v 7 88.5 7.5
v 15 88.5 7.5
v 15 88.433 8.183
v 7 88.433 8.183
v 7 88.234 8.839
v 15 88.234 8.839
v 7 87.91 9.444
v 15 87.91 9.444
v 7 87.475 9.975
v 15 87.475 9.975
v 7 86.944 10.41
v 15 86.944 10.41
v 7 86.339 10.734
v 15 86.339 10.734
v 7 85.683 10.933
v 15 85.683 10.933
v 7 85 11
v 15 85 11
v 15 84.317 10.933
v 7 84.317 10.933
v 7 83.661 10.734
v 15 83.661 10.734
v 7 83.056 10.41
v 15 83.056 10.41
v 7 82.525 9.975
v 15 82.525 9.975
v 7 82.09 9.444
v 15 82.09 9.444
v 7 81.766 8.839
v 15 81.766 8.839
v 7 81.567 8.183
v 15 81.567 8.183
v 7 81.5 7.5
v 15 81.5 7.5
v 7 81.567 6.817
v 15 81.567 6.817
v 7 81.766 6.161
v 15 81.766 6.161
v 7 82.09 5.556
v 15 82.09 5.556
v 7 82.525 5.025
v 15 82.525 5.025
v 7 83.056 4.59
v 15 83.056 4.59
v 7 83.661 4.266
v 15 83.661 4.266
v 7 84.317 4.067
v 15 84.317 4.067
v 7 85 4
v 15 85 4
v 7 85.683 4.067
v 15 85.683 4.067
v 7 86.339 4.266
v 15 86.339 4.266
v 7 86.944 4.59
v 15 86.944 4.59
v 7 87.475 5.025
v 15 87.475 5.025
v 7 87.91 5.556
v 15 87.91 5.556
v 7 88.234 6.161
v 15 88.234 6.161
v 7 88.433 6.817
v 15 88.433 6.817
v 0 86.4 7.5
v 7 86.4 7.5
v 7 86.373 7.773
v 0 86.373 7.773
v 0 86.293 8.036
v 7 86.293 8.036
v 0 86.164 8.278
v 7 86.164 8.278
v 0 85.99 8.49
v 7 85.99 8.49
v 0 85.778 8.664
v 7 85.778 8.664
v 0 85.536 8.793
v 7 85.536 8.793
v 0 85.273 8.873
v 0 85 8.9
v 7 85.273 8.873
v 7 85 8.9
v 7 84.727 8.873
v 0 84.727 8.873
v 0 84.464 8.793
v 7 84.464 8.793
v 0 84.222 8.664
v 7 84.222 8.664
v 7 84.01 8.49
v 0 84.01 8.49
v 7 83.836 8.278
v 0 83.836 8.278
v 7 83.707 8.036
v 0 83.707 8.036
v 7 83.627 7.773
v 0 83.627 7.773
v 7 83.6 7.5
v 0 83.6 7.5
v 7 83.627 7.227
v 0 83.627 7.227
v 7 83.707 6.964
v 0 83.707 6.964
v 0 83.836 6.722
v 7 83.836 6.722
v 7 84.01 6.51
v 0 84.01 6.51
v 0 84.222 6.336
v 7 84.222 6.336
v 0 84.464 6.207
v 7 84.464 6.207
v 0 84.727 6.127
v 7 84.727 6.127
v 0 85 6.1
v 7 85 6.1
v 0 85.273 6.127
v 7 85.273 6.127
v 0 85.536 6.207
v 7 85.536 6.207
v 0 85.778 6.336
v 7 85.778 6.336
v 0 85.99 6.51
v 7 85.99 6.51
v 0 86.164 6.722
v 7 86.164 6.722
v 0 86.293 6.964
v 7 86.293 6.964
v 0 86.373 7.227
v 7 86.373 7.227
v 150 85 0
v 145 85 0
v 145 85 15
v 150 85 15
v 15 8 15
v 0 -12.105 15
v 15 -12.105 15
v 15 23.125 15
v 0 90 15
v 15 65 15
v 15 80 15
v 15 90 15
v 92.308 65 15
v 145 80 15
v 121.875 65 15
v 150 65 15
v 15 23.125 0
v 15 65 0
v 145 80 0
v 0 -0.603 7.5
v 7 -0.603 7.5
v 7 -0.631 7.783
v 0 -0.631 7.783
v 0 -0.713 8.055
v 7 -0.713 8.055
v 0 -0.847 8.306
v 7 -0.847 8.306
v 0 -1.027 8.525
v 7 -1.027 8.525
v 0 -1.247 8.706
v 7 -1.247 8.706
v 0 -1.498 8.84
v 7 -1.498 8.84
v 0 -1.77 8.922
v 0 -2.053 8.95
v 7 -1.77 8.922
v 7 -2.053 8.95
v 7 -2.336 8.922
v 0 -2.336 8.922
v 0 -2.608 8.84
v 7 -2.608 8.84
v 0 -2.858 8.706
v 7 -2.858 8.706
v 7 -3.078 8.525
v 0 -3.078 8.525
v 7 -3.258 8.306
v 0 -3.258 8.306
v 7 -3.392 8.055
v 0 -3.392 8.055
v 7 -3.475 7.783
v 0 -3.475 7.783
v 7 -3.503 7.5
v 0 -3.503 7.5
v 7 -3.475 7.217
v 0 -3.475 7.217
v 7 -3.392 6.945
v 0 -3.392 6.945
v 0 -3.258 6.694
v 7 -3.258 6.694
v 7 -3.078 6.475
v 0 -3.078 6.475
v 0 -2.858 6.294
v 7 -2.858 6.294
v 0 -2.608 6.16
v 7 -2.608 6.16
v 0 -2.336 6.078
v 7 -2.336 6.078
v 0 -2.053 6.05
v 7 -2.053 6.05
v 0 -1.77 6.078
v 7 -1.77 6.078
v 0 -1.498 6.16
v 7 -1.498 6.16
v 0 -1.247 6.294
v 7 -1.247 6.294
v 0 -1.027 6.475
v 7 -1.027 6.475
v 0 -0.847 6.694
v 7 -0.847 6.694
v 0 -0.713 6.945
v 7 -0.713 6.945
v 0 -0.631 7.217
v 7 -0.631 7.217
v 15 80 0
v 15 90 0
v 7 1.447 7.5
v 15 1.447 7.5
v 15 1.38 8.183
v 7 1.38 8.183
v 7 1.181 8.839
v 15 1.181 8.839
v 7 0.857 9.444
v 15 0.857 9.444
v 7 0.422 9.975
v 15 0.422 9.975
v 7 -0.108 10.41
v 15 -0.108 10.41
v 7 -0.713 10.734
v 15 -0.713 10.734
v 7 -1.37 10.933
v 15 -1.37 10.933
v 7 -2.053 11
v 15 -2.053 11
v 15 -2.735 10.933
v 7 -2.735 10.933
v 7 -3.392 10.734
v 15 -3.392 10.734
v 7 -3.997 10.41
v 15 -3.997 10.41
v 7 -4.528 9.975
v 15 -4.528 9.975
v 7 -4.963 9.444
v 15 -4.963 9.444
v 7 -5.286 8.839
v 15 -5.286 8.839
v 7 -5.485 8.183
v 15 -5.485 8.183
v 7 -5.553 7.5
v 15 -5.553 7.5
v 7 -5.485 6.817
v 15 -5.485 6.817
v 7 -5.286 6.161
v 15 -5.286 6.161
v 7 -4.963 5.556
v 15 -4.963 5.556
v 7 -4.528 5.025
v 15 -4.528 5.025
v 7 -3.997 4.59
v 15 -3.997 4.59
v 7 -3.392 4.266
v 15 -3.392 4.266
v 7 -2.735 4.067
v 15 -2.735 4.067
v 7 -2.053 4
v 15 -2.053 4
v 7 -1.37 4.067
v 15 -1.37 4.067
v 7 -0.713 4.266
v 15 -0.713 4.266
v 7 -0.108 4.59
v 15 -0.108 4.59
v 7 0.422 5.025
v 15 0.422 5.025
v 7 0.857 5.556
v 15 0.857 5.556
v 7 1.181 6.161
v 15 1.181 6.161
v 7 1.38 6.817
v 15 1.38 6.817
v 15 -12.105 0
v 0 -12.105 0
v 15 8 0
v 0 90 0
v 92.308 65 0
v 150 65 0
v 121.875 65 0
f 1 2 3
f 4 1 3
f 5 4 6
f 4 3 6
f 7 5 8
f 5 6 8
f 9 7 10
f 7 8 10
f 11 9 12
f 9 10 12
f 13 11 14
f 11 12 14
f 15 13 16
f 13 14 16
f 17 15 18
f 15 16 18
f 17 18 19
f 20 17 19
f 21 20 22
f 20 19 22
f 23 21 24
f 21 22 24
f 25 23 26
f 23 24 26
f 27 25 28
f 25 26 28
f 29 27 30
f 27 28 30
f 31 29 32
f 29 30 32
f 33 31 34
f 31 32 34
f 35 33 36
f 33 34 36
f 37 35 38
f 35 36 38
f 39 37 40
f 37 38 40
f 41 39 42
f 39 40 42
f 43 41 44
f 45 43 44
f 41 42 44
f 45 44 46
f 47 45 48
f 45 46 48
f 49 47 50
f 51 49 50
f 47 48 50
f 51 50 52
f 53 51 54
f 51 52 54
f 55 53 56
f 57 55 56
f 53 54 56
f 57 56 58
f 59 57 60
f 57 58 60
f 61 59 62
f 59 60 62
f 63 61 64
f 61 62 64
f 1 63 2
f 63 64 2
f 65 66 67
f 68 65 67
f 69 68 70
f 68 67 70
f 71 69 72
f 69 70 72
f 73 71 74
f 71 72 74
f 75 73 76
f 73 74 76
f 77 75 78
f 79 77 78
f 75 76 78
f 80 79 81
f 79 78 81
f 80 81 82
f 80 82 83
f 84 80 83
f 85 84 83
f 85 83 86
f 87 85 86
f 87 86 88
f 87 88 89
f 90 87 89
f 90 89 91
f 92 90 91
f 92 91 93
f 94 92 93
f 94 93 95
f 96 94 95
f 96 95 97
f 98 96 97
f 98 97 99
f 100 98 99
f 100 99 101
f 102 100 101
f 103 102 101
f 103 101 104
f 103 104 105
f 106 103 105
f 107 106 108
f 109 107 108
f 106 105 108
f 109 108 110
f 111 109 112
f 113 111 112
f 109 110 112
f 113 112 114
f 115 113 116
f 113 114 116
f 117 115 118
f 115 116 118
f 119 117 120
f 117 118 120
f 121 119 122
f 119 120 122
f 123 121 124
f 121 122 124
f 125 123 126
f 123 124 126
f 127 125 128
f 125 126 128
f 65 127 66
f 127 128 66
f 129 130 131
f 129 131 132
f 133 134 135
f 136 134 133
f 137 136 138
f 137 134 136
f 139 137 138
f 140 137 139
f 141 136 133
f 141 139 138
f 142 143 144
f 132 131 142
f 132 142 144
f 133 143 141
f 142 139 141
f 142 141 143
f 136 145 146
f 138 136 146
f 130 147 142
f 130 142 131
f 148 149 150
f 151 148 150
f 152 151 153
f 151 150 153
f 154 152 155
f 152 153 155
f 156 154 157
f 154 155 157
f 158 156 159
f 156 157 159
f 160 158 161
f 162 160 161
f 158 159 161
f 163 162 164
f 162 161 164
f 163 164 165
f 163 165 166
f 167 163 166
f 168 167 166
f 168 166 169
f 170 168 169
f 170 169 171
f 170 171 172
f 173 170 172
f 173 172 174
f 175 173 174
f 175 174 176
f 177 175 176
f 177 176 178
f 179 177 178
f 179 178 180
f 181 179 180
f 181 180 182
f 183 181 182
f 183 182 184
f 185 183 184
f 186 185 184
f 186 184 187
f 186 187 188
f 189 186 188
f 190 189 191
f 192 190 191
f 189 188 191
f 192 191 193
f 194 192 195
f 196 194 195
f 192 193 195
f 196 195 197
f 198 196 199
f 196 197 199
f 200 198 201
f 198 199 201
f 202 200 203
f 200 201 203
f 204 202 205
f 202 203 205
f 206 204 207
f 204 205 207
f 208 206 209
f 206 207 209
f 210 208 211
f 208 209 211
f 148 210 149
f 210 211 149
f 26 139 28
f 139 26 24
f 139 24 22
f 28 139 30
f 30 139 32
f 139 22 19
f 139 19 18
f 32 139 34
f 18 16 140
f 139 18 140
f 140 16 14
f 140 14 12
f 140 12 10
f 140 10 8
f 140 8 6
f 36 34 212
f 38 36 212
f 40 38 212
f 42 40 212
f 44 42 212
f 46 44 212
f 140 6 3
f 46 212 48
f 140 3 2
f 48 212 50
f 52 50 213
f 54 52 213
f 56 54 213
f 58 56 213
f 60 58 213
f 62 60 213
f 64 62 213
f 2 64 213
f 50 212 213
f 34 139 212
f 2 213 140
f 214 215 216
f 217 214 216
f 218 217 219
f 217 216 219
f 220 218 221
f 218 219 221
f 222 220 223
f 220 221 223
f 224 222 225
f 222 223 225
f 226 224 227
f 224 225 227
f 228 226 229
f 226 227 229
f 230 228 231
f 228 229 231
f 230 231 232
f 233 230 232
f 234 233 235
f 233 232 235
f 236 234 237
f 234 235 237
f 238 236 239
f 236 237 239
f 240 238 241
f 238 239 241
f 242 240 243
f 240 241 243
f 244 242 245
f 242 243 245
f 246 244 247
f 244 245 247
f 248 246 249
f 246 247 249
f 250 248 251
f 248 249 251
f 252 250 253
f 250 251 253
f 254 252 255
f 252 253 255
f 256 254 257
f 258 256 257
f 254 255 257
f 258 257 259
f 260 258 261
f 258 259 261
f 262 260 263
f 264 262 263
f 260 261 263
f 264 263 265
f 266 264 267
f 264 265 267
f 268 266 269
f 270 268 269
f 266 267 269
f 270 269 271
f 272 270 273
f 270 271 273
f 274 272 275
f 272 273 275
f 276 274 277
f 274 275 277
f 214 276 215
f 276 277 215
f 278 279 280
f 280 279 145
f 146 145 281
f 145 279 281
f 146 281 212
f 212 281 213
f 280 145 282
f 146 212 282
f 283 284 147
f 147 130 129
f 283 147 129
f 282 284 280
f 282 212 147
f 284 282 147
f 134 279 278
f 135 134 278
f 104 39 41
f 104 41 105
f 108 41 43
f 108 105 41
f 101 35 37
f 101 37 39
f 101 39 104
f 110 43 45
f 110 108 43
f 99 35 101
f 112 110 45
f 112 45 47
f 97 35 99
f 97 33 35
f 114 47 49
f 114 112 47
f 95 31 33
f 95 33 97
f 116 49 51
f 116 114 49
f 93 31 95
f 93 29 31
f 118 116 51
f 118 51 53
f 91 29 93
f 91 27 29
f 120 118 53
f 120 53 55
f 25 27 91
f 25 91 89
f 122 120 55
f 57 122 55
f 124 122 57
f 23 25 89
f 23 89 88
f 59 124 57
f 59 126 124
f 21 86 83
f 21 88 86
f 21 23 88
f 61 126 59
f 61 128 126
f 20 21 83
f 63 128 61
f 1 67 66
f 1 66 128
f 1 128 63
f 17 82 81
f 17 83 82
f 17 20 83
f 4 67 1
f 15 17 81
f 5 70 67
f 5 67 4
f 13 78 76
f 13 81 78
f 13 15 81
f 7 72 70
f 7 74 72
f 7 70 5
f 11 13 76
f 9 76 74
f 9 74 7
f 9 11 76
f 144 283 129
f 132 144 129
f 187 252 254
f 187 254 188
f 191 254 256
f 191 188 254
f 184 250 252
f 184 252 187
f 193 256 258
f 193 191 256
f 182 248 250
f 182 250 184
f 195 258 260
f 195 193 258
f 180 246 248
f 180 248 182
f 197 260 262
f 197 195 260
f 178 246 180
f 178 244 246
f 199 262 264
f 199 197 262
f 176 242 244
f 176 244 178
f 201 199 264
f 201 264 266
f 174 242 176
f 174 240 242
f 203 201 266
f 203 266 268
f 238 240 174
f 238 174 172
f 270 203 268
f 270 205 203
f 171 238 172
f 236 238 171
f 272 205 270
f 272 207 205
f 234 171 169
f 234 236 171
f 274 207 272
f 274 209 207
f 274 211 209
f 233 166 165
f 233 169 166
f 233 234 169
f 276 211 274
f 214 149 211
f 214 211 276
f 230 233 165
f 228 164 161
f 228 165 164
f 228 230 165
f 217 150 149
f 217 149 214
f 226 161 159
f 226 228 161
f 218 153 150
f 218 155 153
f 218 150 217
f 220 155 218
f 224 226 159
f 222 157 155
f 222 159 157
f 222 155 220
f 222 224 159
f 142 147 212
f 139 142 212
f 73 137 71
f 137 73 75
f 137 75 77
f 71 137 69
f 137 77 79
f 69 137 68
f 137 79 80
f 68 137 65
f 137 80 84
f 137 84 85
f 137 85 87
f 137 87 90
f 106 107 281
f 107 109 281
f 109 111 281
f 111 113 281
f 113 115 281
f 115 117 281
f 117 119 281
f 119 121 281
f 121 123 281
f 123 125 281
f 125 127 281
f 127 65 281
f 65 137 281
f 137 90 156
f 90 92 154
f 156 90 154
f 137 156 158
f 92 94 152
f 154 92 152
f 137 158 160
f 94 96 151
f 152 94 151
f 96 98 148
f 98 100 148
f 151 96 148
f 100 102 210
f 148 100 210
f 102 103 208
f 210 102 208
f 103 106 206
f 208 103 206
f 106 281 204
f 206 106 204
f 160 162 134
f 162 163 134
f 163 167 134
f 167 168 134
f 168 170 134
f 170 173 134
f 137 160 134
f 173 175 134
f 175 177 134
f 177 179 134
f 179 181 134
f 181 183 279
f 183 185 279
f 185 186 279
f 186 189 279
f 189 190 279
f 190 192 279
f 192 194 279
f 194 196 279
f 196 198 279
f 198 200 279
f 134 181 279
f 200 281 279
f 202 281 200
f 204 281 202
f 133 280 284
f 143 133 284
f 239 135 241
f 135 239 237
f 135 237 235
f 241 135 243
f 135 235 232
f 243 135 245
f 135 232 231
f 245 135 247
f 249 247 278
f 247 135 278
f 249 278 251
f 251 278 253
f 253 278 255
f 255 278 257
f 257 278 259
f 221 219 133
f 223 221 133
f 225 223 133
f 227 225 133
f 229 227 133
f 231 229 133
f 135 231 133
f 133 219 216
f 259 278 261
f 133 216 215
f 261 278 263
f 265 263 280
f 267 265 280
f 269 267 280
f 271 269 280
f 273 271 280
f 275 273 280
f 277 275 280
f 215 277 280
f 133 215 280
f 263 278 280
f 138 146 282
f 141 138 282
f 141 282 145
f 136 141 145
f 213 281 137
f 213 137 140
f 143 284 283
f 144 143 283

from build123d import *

# Parameters (mm, degrees)
F0_W     = 15
F0_H     = 15
F0_H_2   = 10
F0_W_2   = 5
F0_H_3   = 5
F1_DEPTH = 15
F2_R     = 1.4
F3_DEPTH = 25
F2_R_2   = 3.5
F4_DEPTH = 8
F5_R     = 3.5
F5_R_2   = 1.45
F6_DEPTH = 8
F7_DEPTH = 25


with BuildPart() as f1:
    # F0 (on Top) → F1 (new body)
    with BuildSketch(Plane.XY):
        Polygon((0, 15), (0, 0), (15, 8), (15, 23.125), align=None)
        Polygon((0, 65), (0, 15), (15, 23.125), (15, 65), align=None)
        Polygon((15, 23.125), (15, 8), (121.875, 65), (92.3076923077, 65), align=None)
        Polygon((15, 8), (0, 0), (0, -12.10534852), (15, -12.10534852), align=None)
        Polygon((15, 80), (15, 65), (92.3076923077, 65), (120, 80), align=None)
        with Locations((7.5, 72.5)):
            Rectangle(F0_W, F0_H)
        with Locations((7.5, 85)):
            Rectangle(F0_W, F0_H_2)
        Polygon((92.3076923077, 65), (121.875, 65), (150, 80), (145, 80), (120, 80), align=None)
        Polygon((150, 80), (121.875, 65), (150, 65), align=None)
        with Locations((147.5, 82.5)):
            Rectangle(F0_W_2, F0_H_3)
    extrude(amount=F1_DEPTH)

    # F2 (on face) → F3 (cut)
    with BuildSketch(Plane.YZ.offset(15)):
        with Locations((85, 7.5)):
            Circle(F2_R)
    extrude(amount=-F3_DEPTH, mode=Mode.SUBTRACT)

    # F2 (on face) → F4 (cut)
    with BuildSketch(Plane.YZ.offset(15)):
        with Locations((85, 7.5)):
            Circle(F2_R_2)
        with Locations((85, 7.5)):
            Circle(F2_R, mode=Mode.SUBTRACT)
    extrude(amount=-F4_DEPTH, mode=Mode.SUBTRACT)

    # F5 (on face) → F6 (cut)
    with BuildSketch(Plane.YZ.offset(15)):
        with Locations((-2.05267426, 7.5)):
            Circle(F5_R)
        with Locations((-2.05267426, 7.5)):
            Circle(F5_R_2, mode=Mode.SUBTRACT)
    extrude(amount=-F6_DEPTH, mode=Mode.SUBTRACT)

    # F7 (cut): a face of the model
    f7_faces = [f1.faces().sort_by_distance(p)[0] for p in [
        (15, -2.05267426, 7.5),
    ]]
    extrude(f7_faces, amount=-F7_DEPTH, mode=Mode.SUBTRACT)


solid = f1.part
